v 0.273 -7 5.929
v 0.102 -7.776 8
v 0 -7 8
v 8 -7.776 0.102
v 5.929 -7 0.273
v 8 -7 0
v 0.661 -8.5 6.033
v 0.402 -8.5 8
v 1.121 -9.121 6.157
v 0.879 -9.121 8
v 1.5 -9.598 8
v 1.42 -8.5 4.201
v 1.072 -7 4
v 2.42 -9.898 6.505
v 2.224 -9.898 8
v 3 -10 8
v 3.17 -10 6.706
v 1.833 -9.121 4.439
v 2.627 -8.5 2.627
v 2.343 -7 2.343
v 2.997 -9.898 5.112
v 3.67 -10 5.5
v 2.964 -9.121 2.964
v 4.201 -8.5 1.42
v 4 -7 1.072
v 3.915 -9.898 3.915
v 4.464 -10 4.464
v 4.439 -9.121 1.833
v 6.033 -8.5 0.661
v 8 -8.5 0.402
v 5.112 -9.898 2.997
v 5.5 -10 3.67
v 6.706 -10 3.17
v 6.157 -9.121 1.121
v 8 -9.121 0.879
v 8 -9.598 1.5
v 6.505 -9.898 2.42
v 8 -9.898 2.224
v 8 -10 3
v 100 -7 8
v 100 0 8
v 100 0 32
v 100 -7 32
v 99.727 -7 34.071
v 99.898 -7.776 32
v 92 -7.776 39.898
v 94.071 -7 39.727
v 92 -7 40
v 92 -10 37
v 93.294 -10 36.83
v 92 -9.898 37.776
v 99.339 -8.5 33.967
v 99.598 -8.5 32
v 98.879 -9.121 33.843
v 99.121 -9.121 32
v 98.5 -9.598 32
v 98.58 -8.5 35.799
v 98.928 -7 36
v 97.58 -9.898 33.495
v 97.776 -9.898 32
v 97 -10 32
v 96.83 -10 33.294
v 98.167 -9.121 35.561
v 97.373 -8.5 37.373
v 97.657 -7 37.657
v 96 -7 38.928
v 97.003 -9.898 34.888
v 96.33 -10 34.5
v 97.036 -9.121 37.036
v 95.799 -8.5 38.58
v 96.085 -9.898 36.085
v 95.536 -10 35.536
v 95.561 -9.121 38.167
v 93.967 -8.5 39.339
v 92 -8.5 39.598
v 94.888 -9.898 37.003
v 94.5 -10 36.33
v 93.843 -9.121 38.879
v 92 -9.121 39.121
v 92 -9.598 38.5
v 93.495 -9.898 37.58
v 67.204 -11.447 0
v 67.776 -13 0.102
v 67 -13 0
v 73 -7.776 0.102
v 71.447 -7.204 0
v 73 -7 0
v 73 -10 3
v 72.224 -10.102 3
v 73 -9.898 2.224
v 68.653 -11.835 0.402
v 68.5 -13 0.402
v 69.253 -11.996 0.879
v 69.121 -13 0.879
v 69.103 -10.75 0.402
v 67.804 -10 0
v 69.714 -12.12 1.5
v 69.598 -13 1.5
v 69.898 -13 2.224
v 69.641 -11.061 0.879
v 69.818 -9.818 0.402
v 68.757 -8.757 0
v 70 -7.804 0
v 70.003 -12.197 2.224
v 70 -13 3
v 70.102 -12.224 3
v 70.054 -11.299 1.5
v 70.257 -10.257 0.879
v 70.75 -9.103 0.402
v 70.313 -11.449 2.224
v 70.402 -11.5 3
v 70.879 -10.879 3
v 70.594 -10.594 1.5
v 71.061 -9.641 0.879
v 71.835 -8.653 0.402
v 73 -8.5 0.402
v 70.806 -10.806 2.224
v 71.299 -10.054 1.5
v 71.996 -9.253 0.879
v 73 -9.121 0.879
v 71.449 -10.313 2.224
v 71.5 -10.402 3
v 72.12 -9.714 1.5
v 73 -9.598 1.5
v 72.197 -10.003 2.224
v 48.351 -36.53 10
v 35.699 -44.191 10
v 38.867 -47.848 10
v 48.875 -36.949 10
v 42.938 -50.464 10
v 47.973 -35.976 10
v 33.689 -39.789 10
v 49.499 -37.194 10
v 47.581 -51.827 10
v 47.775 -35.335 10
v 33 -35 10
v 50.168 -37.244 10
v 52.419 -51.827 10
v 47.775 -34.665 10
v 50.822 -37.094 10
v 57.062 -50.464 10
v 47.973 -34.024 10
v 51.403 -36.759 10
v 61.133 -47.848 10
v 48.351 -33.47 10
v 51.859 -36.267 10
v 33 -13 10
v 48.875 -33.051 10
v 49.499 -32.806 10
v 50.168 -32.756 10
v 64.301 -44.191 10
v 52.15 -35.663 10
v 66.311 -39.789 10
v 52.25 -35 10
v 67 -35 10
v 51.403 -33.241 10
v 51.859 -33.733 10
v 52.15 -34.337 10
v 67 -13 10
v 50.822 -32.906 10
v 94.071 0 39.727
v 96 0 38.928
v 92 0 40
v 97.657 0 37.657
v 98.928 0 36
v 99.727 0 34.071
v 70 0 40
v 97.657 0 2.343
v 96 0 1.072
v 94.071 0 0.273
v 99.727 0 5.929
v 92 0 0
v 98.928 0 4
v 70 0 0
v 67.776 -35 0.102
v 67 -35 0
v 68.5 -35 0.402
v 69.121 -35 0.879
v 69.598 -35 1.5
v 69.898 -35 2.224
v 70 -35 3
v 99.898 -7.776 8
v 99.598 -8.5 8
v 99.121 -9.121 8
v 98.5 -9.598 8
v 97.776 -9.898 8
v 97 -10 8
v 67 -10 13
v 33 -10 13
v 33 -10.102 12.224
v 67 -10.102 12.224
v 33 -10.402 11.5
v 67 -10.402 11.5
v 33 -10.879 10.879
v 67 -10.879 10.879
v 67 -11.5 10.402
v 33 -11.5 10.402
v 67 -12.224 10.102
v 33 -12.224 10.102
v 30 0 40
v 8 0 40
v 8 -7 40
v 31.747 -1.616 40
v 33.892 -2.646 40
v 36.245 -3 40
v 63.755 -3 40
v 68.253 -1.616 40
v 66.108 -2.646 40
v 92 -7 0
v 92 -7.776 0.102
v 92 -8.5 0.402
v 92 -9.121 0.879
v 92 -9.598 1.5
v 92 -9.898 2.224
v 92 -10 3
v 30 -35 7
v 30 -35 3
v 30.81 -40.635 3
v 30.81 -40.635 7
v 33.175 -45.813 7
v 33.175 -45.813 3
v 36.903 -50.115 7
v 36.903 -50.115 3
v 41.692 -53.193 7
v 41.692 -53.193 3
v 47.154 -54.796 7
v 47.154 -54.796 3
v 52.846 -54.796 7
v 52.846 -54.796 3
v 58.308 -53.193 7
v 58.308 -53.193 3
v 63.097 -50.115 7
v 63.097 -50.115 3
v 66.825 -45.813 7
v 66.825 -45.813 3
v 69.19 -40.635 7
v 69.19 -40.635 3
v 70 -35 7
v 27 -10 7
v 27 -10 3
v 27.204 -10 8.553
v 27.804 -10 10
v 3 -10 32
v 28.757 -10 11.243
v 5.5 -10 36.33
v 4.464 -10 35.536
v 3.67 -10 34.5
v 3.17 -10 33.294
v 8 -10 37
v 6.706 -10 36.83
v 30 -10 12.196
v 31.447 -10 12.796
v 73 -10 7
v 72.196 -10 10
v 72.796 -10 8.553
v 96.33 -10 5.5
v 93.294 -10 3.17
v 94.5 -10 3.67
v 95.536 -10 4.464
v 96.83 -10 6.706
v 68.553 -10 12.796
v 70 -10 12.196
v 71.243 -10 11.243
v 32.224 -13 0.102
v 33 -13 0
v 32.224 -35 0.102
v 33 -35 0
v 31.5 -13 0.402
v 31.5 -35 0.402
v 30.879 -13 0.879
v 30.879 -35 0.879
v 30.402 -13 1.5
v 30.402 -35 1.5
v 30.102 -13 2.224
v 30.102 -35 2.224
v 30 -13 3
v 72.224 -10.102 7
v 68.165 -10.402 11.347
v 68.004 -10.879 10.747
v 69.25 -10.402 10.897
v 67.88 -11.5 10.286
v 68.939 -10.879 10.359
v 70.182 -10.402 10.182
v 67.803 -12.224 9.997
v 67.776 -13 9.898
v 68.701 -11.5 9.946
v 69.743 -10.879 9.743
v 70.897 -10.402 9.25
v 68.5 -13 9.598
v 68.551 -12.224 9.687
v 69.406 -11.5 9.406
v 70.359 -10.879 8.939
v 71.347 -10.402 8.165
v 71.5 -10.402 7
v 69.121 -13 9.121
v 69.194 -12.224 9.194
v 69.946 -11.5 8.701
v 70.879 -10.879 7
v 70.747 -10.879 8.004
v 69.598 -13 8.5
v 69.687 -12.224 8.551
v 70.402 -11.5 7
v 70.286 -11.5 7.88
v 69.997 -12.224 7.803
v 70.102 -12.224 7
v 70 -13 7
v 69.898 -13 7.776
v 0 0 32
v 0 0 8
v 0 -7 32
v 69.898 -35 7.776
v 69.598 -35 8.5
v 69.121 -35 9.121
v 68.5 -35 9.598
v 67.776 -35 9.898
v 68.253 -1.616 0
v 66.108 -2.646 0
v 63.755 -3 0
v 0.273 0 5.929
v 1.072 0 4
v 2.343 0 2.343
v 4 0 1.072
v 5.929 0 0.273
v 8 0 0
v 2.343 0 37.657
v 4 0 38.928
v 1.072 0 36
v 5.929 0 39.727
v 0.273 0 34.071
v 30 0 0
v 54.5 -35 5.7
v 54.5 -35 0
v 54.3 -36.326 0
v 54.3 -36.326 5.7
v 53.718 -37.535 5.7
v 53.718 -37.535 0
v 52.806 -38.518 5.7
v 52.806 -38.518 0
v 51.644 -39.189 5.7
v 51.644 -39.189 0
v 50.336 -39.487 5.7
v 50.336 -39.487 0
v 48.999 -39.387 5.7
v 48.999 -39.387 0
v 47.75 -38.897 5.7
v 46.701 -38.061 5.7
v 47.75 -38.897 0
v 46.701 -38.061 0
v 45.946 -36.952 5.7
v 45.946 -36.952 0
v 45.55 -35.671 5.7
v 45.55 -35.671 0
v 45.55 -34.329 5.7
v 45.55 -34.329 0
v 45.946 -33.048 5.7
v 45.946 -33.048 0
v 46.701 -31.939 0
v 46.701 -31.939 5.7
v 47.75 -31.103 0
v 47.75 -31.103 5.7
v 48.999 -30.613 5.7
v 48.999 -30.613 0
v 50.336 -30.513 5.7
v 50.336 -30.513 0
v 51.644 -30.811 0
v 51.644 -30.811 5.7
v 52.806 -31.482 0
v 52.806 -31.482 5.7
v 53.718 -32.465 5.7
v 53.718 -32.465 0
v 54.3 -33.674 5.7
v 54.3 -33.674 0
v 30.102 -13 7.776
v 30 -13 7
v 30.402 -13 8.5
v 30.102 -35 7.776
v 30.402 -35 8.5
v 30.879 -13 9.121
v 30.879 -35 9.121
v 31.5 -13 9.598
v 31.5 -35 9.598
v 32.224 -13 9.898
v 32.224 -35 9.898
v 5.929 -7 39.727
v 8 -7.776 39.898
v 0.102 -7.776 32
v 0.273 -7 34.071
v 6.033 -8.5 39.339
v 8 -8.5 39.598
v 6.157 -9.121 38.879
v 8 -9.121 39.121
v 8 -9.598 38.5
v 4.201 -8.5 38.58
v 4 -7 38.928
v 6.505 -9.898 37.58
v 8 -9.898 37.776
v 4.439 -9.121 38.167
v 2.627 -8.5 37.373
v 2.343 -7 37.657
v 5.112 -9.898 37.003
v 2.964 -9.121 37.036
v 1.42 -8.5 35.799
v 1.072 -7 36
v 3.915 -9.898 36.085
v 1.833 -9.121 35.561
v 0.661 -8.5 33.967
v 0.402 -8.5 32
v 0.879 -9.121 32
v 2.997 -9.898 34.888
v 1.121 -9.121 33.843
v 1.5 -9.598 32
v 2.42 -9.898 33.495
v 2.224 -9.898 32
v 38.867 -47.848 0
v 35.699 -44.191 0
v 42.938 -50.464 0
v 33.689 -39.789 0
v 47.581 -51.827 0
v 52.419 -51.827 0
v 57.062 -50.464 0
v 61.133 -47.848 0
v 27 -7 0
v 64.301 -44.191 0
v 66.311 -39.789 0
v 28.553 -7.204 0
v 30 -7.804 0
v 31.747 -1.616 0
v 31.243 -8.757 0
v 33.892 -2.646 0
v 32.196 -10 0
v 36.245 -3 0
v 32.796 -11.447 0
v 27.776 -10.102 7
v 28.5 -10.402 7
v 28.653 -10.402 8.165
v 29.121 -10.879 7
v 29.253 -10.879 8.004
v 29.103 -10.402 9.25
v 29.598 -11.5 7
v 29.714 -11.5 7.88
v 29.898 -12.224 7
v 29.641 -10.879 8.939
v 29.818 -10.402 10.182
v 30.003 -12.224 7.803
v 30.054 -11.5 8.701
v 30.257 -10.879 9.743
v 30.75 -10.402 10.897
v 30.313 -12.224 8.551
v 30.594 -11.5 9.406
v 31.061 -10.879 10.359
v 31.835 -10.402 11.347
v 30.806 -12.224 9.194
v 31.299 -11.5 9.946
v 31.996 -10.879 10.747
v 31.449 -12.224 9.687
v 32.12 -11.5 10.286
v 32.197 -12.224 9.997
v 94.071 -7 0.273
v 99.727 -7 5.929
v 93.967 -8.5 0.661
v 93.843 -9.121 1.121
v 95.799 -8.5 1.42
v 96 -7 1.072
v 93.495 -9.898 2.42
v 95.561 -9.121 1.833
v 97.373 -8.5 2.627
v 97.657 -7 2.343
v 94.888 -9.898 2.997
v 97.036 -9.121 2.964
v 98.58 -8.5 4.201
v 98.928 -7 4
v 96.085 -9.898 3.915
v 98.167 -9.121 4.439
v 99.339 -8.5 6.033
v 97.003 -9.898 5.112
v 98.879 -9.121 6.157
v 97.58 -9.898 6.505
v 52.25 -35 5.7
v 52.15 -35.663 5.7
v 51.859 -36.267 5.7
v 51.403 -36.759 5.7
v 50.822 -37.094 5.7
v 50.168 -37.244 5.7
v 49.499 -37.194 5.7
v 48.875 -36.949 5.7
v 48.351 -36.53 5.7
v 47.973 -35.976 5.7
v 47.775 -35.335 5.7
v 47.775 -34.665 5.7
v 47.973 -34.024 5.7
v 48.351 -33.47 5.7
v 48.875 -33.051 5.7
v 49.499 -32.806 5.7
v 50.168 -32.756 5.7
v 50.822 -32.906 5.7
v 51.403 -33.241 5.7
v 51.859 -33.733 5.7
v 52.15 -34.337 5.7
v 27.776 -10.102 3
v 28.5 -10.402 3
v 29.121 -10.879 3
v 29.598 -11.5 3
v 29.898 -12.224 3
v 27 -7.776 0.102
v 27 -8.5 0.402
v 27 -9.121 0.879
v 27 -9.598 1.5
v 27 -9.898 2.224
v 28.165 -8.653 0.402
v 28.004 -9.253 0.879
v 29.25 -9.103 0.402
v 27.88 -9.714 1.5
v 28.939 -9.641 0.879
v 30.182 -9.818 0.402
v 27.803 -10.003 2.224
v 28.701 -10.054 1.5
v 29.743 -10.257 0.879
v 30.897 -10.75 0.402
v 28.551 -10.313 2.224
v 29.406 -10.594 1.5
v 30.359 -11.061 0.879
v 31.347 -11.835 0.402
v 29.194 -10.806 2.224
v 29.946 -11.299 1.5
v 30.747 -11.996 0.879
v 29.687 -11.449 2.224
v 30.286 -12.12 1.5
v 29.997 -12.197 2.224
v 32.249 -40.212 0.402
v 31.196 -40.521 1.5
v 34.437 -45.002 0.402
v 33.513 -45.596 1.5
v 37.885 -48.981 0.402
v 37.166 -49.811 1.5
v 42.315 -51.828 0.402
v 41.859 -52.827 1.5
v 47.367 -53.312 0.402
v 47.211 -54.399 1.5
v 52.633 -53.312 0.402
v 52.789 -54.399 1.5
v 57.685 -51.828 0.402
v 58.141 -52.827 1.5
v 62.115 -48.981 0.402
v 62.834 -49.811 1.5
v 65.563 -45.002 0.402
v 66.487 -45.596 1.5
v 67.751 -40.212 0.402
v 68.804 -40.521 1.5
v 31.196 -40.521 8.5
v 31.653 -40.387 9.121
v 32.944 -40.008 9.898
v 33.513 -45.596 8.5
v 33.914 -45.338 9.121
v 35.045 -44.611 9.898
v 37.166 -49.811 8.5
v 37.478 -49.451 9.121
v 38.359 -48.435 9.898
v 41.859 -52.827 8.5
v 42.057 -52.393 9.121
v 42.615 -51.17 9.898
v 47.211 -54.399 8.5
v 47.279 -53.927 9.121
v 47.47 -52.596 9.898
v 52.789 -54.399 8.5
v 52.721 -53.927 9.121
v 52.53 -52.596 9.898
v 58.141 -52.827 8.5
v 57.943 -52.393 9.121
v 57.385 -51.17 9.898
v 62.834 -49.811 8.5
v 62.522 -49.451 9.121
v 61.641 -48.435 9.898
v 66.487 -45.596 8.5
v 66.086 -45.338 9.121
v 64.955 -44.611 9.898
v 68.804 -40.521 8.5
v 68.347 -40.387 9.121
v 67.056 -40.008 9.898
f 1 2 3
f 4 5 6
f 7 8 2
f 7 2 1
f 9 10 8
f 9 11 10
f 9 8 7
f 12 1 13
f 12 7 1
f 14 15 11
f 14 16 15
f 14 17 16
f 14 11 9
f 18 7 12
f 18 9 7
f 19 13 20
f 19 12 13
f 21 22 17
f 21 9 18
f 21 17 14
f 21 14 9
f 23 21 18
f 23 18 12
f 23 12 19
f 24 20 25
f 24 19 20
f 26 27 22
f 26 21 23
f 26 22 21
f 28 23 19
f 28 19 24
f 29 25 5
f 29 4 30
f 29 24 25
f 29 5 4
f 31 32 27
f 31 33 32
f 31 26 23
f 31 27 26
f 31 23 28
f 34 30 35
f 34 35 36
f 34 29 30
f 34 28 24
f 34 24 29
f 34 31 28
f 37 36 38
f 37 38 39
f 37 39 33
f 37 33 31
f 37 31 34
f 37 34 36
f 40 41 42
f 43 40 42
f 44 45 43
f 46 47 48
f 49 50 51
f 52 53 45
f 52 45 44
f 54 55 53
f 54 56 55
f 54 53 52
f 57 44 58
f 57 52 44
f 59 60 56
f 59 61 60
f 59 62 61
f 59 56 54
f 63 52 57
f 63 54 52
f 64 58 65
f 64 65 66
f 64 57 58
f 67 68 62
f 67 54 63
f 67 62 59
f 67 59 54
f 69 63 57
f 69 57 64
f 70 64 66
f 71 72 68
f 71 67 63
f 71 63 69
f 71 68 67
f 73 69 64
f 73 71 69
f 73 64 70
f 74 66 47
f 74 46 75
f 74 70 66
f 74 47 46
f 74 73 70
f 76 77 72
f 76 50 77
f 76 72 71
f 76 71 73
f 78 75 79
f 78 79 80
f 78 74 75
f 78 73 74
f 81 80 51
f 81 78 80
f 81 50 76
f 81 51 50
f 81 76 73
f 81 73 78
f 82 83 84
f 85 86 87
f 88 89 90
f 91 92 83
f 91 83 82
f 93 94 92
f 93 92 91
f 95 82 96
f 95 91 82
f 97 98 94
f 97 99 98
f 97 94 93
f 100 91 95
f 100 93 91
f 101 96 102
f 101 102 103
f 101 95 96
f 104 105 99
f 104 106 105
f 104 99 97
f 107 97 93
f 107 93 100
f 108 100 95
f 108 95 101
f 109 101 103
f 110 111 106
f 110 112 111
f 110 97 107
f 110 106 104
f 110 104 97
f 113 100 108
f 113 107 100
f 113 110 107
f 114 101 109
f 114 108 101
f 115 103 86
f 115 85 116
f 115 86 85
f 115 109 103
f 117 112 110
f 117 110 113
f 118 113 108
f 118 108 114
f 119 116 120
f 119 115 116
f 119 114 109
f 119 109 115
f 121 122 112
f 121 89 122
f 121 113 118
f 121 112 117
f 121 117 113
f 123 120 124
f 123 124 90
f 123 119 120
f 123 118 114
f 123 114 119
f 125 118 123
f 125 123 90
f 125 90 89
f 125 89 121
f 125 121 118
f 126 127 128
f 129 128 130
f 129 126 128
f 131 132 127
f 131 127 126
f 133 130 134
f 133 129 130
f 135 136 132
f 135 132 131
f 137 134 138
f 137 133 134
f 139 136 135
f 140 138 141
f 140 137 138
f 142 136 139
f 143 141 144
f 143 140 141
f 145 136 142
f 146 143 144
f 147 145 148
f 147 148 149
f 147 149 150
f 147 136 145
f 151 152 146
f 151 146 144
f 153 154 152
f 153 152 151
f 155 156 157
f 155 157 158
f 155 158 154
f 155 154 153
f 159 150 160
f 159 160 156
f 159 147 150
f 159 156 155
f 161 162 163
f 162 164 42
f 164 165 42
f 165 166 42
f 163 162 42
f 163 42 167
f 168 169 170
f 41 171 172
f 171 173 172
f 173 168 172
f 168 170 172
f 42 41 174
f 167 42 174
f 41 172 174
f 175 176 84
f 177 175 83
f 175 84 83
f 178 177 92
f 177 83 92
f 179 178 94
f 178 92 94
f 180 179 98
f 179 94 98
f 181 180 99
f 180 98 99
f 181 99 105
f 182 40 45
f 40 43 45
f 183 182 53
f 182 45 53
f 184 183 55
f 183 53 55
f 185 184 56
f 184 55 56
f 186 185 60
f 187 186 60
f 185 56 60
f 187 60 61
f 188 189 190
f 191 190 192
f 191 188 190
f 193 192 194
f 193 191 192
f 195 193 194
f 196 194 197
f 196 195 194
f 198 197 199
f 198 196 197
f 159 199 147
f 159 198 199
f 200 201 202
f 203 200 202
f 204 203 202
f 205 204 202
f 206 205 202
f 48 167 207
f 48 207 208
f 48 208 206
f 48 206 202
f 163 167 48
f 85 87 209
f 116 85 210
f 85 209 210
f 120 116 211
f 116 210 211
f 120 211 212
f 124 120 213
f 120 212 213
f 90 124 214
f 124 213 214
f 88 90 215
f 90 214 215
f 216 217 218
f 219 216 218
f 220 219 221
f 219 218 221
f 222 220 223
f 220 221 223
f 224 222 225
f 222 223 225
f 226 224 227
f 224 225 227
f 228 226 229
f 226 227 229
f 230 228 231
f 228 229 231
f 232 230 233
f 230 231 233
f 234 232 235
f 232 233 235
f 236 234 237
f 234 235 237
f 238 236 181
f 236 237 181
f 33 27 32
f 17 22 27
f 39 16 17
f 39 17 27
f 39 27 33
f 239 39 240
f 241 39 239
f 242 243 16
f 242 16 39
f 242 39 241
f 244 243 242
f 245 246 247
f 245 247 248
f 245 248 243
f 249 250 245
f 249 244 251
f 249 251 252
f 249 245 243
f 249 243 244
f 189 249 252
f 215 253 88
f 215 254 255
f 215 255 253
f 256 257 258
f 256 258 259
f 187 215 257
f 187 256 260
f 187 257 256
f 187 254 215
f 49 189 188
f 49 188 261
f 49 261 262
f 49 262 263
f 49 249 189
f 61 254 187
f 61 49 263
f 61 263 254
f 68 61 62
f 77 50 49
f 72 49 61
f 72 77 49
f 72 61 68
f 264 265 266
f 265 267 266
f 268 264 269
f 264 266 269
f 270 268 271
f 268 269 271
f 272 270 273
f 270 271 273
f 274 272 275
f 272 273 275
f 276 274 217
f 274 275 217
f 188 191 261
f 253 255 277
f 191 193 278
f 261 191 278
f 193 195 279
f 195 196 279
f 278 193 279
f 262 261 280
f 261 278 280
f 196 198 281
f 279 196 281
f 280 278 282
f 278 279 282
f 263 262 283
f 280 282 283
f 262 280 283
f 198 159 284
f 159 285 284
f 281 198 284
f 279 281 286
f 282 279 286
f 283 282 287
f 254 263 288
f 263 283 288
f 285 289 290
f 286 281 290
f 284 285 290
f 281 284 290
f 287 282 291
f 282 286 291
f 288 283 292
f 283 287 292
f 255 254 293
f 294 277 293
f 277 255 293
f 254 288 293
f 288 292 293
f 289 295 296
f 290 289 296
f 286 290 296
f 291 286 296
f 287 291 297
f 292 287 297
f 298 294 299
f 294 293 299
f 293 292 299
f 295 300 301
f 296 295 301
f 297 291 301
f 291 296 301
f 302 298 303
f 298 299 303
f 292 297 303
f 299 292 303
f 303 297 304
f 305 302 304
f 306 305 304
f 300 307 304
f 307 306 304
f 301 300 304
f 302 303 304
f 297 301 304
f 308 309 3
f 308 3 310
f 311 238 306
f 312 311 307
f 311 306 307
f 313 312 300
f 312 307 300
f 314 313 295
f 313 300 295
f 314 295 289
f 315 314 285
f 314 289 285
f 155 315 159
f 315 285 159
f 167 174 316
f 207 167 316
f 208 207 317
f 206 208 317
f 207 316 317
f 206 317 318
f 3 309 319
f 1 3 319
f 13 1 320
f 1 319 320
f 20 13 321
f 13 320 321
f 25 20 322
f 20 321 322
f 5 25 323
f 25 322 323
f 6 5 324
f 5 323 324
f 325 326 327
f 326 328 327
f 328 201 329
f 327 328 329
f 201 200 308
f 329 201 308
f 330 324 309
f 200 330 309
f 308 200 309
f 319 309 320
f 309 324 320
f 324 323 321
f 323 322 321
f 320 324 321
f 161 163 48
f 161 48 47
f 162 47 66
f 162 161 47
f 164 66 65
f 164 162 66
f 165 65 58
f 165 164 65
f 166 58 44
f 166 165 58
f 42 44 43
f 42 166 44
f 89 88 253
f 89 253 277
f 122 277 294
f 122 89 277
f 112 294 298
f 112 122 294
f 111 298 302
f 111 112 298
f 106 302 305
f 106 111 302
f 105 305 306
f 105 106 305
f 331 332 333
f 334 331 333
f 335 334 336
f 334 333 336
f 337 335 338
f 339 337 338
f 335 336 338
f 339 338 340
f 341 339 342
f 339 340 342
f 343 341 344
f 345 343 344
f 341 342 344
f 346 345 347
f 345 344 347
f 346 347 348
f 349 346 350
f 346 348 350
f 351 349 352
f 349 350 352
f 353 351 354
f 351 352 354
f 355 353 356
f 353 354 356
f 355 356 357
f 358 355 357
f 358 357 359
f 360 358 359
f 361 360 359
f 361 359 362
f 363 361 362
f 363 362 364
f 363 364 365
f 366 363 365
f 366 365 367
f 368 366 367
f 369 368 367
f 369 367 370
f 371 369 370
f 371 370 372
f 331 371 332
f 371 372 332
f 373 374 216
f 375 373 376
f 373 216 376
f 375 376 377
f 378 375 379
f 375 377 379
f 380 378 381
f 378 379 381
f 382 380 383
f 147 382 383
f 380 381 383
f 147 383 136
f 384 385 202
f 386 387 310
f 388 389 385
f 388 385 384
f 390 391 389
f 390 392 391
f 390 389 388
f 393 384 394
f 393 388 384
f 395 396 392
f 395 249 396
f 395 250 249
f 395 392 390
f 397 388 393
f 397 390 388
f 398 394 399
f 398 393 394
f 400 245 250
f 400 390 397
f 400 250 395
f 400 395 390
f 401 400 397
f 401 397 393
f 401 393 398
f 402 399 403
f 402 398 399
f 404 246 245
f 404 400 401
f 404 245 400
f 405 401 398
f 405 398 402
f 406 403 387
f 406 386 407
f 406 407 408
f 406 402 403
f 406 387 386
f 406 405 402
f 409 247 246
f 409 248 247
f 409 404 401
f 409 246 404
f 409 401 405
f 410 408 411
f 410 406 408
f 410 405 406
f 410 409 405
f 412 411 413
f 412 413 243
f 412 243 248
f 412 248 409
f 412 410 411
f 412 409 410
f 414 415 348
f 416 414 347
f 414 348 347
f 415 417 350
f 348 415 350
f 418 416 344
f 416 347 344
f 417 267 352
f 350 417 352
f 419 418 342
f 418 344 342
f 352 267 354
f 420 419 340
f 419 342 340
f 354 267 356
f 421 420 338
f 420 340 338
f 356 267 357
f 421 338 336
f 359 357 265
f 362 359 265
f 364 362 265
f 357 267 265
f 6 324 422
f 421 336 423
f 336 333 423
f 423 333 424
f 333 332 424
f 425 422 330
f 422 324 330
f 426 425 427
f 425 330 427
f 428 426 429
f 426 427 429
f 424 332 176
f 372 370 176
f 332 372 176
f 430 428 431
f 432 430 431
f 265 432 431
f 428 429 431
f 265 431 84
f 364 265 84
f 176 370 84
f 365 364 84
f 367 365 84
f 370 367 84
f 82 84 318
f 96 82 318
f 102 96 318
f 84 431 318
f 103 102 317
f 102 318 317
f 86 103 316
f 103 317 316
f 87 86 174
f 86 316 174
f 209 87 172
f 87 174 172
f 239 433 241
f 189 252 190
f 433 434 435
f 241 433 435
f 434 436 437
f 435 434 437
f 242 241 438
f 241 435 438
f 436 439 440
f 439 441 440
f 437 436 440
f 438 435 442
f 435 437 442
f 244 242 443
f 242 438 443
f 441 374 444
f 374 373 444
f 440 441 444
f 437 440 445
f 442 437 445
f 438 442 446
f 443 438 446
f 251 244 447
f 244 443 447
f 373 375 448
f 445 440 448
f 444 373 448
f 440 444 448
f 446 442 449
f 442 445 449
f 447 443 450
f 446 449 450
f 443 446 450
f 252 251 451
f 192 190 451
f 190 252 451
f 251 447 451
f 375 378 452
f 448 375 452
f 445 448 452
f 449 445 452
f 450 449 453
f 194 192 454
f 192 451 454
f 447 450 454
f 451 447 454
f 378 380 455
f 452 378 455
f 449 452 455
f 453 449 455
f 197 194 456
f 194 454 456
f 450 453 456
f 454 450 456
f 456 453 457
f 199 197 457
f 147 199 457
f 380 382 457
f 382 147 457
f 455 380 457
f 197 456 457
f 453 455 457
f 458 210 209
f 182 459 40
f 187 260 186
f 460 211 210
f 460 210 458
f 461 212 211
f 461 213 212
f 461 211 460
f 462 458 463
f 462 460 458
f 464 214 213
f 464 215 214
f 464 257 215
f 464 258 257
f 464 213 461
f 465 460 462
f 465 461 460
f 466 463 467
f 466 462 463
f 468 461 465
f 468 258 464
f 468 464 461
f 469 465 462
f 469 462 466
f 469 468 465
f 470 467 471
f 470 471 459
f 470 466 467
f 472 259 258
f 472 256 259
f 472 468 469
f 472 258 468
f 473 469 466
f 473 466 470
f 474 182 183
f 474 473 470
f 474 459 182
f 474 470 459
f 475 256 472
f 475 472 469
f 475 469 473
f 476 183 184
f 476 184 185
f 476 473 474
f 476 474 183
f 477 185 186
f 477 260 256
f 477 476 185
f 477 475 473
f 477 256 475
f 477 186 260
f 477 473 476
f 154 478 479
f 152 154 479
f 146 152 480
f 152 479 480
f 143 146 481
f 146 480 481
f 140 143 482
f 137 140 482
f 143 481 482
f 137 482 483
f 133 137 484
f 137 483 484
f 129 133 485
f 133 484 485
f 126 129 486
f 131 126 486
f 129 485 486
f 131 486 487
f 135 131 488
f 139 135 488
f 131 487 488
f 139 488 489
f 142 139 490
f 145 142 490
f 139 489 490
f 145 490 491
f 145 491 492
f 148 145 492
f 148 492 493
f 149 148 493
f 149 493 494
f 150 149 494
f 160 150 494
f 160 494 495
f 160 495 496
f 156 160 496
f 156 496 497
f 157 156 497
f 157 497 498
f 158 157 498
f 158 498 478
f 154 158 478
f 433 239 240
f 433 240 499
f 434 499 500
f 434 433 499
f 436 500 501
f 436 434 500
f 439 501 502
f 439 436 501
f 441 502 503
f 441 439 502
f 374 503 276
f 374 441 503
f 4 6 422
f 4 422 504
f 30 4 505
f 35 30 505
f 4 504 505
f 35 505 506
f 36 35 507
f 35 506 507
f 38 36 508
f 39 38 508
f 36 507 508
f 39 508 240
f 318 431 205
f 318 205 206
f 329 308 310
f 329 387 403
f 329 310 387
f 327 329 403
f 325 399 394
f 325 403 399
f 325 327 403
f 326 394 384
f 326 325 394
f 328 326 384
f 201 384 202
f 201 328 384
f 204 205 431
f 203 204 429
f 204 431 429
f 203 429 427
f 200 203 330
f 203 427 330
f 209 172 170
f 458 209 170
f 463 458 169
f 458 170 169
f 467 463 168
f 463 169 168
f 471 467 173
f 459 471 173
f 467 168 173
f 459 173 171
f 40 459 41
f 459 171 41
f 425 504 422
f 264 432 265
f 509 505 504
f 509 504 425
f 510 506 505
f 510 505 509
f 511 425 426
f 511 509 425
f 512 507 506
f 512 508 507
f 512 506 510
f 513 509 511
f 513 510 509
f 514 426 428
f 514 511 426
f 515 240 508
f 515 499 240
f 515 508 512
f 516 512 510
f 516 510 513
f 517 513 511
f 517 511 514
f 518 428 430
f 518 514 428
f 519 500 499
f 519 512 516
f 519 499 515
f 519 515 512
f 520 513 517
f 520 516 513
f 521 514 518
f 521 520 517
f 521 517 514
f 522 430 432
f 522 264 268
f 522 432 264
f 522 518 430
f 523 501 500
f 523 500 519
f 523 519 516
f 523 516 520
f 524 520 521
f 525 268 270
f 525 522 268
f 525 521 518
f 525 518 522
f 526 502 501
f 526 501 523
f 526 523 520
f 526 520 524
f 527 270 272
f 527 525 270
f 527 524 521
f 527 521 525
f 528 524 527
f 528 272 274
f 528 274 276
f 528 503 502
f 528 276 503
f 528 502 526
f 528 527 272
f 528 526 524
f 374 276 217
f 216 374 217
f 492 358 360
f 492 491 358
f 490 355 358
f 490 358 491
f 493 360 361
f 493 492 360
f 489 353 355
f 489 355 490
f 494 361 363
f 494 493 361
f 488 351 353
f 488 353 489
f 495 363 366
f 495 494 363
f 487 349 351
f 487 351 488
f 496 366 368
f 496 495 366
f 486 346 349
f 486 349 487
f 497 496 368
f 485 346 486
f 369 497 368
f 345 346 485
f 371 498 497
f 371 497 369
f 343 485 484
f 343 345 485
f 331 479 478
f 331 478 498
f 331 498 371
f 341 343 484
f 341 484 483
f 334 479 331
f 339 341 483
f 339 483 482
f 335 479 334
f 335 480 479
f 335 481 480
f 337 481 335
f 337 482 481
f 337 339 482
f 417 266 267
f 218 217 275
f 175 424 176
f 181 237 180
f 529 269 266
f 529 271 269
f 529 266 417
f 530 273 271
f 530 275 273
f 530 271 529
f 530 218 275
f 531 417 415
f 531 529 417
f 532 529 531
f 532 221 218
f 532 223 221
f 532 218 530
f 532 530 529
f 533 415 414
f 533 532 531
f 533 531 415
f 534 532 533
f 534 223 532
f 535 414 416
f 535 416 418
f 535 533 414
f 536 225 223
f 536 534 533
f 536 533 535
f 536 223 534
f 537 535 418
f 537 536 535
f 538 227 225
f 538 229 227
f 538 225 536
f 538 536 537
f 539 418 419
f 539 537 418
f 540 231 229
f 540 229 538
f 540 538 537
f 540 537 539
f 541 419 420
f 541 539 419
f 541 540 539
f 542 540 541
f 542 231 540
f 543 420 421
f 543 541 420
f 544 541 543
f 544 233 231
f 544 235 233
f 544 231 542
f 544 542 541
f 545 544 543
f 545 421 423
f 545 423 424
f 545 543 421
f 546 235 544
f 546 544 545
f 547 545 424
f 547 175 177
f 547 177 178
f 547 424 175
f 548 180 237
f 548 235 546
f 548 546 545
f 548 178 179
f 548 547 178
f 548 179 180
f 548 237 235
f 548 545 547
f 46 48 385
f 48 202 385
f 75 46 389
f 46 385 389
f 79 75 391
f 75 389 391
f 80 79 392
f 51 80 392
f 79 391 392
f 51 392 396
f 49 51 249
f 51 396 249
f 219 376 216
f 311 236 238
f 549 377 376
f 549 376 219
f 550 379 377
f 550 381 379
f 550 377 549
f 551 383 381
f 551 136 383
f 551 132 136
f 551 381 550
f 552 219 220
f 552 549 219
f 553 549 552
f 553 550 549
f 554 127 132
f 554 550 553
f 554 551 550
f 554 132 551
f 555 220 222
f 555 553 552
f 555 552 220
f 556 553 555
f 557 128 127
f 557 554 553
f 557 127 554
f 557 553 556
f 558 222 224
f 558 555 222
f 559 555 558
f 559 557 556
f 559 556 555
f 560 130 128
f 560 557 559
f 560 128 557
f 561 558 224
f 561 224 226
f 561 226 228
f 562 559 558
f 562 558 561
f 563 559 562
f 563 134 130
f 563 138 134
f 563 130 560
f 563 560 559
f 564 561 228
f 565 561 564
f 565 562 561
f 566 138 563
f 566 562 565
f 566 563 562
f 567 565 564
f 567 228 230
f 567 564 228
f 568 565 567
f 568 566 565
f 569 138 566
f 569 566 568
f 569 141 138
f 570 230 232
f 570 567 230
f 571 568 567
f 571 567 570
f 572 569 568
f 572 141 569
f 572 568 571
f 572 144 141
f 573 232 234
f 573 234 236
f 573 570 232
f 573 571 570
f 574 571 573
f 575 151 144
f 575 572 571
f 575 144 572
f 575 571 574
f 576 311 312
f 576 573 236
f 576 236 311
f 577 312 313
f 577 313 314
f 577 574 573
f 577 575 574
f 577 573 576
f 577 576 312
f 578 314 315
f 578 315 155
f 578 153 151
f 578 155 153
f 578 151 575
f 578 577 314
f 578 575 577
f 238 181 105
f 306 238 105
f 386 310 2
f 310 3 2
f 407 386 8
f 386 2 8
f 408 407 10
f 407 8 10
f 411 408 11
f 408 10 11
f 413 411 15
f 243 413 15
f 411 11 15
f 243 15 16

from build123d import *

# Parameters (mm, degrees)
F0_W          = 100
F0_H          = 40
F1_DEPTH      = 10
F3_DEPTH      = 10
F4_W          = 40
F4_H          = 3
F5_DEPTH      = 40.001
F6_R          = 2.25
F7_DEPTH      = 40.001
F8_R          = 4.5
F9_DEPTH      = 5.7
F10_T1_DEPTH  = 40
F10_T3_DEPTH  = 40
F10_T5_DEPTH  = 50
F10_T7_DEPTH  = 50
F10_T9_DEPTH  = 50
F10_T11_DEPTH = 50
F11_F1_R      = 3
F11_F2_R      = 3
F11_F3_R      = 3


# Not quite as in the source:
# - a fillet or chamfer that OpenCascade refuses, or shapes differently, is made with other operations: its cross-section is extruded or revolved along the edge and cut away or added


with BuildPart() as f1:
    # F0 (on Front) → F1 (new body)
    with BuildSketch(Plane.XZ):
        with Locations((50, 20)):
            Rectangle(F0_W, F0_H)
    extrude(amount=F1_DEPTH)

    # F2 (on Top) → F3 (join)
    with BuildSketch(Plane.XY):
        with BuildLine():
            Line((70, 0), (30, 0))
            Line((30, 0), (30, -35))
            ThreePointArc((30, -35), (50, -55), (70, -35))
            Line((70, -35), (70, 0))
        make_face()
    extrude(amount=F3_DEPTH)

    # F4 (on face) → F5 (cut, through all)
    with BuildSketch(Plane(origin=(0, 0, 0), x_dir=(1, 0, 0), z_dir=(0, 0, -1))):
        with Locations((50, 1.5)):
            Rectangle(F4_W, F4_H)
    extrude(amount=-F5_DEPTH, mode=Mode.SUBTRACT)

    # F6 (on face) → F7 (cut, through all)
    with BuildSketch(Plane(origin=(0, 0, 0), x_dir=(1, 0, 0), z_dir=(0, 0, -1))):
        with Locations((50, 35)):
            Circle(F6_R)
    extrude(amount=-F7_DEPTH, mode=Mode.SUBTRACT)

    # F8 (on face) → F9 (cut)
    with BuildSketch(Plane(origin=(0, 0, 0), x_dir=(1, 0, 0), z_dir=(0, 0, -1))):
        with Locations((50, 35)):
            Circle(F8_R)
    extrude(amount=-F9_DEPTH, mode=Mode.SUBTRACT)

    # F10: fillet of radius 8 on 6 edges, made by hand

    # F10_s2 → F10_t1 (join)
    with BuildSketch(Plane.XY):
        with BuildLine():
            ThreePointArc((70, 0), (67.2191036167, -2.2111025509), (63.7550020016, -3))
            Line((63.7550020016, -3), (70, -3))
            Line((70, -3), (70, 0))
        make_face()
    extrude(amount=F10_T1_DEPTH)

    # F10_s4 → F10_t3 (join)
    with BuildSketch(Plane.XY):
        with BuildLine():
            ThreePointArc((36.2449979984, -3), (32.7808963833, -2.2111025509), (30, 0))
            Line((30, 0), (30, -3))
            Line((30, -3), (36.2449979984, -3))
        make_face()
    extrude(amount=F10_T3_DEPTH)

    # F10_s6 → F10_t5 (cut)
    with BuildSketch(Plane.XZ.offset(-20)):
        with BuildLine():
            ThreePointArc((0, 32), (2.3431457505, 37.6568542495), (8, 40))
            Line((8, 40), (0, 40))
            Line((0, 40), (0, 32))
        make_face()
    extrude(amount=F10_T5_DEPTH, mode=Mode.SUBTRACT)

    # F10_s8 → F10_t7 (cut)
    with BuildSketch(Plane.XZ.offset(-20)):
        with BuildLine():
            ThreePointArc((0, 8), (2.3431457505, 2.3431457505), (8, 0))
            Line((8, 0), (0, 0))
            Line((0, 0), (0, 8))
        make_face()
    extrude(amount=F10_T7_DEPTH, mode=Mode.SUBTRACT)

    # F10_s10 → F10_t9 (cut)
    with BuildSketch(Plane.XZ.offset(-20)):
        with BuildLine():
            ThreePointArc((92, 40), (97.6568542495, 37.6568542495), (100, 32))
            Line((100, 32), (100, 40))
            Line((100, 40), (92, 40))
        make_face()
    extrude(amount=F10_T9_DEPTH, mode=Mode.SUBTRACT)

    # F10_s12 → F10_t11 (cut)
    with BuildSketch(Plane.XZ.offset(-20)):
        with BuildLine():
            ThreePointArc((92, 0), (97.6568542495, 2.3431457505), (100, 8))
            Line((100, 8), (100, 0))
            Line((100, 0), (92, 0))
        make_face()
    extrude(amount=F10_T11_DEPTH, mode=Mode.SUBTRACT)

    # F11: fillet of radius 3 on 17 edges, made by hand

    # F11_f1
    f11_f1_edges = [f1.edges().sort_by_distance(p)[0] for p in [
        (50, -55, 10),
        (70, -22.5, 10),
        (30, -22.5, 10),
    ]]
    fillet(f11_f1_edges, radius=F11_F1_R)

    # F11_f2
    f11_f2_edges = [f1.edges().sort_by_distance(p)[0] for p in [
        (70, -10, 3.5),
        (50, -10, 10),
        (69.1213203436, -10, 9.1213203436),
        (30.8786796564, -10, 9.1213203436),
    ]]
    fillet(f11_f2_edges, radius=F11_F2_R)

    # F11_f3
    f11_f3_edges = [f1.edges().sort_by_distance(p)[0] for p in [
        (50, -55, 0),
        (0, -10, 20),
        (2.3431457505, -10, 2.3431457505),
        (17.5, -10, 0),
        (2.3431457505, -10, 37.6568542495),
        (50, -10, 40),
        (97.6568542495, -10, 37.6568542495),
        (100, -10, 20),
        (97.6568542495, -10, 2.3431457505),
        (82.5, -10, 0),
        (70, -24, 0),
        (30, -24, 0),
        (29.1213203436, -10.8786796564, 0),
        (70.8786796564, -10.8786796564, 0),
    ]]
    fillet(f11_f3_edges, radius=F11_F3_R)


solid = f1.part
